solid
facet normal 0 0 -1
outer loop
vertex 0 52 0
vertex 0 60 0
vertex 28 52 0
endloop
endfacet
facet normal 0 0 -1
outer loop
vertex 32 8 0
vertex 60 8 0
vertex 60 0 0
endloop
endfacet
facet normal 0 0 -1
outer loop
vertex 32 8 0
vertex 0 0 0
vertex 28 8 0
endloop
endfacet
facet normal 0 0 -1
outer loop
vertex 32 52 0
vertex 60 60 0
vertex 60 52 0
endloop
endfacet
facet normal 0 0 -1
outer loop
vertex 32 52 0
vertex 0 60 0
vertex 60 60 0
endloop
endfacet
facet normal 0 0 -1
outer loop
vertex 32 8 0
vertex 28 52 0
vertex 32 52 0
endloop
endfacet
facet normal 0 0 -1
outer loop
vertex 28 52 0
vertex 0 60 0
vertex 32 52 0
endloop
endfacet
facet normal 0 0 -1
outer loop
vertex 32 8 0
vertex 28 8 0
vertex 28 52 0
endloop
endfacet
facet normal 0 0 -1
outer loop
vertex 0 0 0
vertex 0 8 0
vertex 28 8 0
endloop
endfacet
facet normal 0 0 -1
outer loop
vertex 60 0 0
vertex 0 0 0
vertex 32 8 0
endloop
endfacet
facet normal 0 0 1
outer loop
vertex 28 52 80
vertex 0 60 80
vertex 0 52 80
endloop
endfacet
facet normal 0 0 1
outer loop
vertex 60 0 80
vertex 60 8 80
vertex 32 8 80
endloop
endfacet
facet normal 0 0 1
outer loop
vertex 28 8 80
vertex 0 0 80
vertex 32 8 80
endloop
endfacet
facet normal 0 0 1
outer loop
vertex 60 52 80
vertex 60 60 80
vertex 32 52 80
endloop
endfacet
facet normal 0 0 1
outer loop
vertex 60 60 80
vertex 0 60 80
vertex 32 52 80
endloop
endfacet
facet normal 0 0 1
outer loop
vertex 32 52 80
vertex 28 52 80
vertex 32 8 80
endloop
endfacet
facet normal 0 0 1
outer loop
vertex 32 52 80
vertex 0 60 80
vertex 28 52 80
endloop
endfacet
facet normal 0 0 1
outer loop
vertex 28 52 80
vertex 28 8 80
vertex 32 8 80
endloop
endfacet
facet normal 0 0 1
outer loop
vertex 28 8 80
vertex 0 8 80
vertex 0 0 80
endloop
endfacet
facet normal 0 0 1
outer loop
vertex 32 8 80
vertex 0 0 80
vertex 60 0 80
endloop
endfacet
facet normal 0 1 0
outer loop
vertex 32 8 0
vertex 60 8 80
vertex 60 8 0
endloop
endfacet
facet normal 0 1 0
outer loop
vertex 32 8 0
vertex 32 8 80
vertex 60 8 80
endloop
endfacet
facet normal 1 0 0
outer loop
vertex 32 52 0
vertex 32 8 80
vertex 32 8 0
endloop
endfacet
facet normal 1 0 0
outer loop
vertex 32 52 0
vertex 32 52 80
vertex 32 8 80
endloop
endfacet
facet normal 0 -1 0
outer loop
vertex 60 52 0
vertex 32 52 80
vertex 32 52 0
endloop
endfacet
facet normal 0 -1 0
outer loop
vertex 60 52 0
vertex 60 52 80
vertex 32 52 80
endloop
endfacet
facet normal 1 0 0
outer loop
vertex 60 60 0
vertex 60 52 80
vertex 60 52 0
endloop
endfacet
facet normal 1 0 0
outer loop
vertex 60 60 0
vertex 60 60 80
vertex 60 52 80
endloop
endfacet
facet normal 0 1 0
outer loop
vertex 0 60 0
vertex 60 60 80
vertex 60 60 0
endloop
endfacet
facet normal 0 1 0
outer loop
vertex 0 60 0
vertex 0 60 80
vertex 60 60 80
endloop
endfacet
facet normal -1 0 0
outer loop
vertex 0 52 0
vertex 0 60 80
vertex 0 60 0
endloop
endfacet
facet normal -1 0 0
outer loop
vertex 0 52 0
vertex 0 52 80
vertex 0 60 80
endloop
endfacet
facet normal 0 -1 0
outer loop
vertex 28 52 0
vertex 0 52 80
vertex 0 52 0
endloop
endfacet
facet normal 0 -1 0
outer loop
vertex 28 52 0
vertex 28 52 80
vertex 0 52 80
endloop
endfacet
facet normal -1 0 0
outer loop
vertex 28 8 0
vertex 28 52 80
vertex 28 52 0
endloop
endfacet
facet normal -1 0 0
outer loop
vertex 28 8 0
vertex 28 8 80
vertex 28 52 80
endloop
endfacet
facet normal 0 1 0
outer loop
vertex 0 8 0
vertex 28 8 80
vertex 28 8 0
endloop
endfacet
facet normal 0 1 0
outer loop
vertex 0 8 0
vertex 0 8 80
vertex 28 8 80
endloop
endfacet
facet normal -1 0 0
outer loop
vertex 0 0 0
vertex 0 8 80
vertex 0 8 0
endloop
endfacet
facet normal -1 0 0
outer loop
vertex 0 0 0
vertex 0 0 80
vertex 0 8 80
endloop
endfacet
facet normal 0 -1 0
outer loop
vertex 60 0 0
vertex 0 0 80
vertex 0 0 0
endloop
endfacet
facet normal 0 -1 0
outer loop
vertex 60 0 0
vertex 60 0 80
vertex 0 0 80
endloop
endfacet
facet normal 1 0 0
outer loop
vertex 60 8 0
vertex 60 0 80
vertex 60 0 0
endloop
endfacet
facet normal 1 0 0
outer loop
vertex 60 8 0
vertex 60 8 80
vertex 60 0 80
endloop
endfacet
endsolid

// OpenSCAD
$fn = 32;

// ----------------------------------------------------------------------
// Structural section: ibeam 60 x 60 mm
// ----------------------------------------------------------------------

// --- parameters (mm) ---
sec_w = 60;               // section width, X
sec_h = 60;               // section height, Y
flange_t = 8;             // flange thickness
web_t = 4;                // web thickness
plate_t = 80;             // cut length, Z (extrusion height)

profile = [[0, 0], [60, 0], [60, 8], [32, 8], [32, 52], [60, 52], [60, 60], [0, 60], [0, 52], [28, 52], [28, 8], [0, 8]];  // primary outline, 12 points, counter clockwise

// --- the one profile operation ---
linear_extrude(height = plate_t) polygon(points = profile);
